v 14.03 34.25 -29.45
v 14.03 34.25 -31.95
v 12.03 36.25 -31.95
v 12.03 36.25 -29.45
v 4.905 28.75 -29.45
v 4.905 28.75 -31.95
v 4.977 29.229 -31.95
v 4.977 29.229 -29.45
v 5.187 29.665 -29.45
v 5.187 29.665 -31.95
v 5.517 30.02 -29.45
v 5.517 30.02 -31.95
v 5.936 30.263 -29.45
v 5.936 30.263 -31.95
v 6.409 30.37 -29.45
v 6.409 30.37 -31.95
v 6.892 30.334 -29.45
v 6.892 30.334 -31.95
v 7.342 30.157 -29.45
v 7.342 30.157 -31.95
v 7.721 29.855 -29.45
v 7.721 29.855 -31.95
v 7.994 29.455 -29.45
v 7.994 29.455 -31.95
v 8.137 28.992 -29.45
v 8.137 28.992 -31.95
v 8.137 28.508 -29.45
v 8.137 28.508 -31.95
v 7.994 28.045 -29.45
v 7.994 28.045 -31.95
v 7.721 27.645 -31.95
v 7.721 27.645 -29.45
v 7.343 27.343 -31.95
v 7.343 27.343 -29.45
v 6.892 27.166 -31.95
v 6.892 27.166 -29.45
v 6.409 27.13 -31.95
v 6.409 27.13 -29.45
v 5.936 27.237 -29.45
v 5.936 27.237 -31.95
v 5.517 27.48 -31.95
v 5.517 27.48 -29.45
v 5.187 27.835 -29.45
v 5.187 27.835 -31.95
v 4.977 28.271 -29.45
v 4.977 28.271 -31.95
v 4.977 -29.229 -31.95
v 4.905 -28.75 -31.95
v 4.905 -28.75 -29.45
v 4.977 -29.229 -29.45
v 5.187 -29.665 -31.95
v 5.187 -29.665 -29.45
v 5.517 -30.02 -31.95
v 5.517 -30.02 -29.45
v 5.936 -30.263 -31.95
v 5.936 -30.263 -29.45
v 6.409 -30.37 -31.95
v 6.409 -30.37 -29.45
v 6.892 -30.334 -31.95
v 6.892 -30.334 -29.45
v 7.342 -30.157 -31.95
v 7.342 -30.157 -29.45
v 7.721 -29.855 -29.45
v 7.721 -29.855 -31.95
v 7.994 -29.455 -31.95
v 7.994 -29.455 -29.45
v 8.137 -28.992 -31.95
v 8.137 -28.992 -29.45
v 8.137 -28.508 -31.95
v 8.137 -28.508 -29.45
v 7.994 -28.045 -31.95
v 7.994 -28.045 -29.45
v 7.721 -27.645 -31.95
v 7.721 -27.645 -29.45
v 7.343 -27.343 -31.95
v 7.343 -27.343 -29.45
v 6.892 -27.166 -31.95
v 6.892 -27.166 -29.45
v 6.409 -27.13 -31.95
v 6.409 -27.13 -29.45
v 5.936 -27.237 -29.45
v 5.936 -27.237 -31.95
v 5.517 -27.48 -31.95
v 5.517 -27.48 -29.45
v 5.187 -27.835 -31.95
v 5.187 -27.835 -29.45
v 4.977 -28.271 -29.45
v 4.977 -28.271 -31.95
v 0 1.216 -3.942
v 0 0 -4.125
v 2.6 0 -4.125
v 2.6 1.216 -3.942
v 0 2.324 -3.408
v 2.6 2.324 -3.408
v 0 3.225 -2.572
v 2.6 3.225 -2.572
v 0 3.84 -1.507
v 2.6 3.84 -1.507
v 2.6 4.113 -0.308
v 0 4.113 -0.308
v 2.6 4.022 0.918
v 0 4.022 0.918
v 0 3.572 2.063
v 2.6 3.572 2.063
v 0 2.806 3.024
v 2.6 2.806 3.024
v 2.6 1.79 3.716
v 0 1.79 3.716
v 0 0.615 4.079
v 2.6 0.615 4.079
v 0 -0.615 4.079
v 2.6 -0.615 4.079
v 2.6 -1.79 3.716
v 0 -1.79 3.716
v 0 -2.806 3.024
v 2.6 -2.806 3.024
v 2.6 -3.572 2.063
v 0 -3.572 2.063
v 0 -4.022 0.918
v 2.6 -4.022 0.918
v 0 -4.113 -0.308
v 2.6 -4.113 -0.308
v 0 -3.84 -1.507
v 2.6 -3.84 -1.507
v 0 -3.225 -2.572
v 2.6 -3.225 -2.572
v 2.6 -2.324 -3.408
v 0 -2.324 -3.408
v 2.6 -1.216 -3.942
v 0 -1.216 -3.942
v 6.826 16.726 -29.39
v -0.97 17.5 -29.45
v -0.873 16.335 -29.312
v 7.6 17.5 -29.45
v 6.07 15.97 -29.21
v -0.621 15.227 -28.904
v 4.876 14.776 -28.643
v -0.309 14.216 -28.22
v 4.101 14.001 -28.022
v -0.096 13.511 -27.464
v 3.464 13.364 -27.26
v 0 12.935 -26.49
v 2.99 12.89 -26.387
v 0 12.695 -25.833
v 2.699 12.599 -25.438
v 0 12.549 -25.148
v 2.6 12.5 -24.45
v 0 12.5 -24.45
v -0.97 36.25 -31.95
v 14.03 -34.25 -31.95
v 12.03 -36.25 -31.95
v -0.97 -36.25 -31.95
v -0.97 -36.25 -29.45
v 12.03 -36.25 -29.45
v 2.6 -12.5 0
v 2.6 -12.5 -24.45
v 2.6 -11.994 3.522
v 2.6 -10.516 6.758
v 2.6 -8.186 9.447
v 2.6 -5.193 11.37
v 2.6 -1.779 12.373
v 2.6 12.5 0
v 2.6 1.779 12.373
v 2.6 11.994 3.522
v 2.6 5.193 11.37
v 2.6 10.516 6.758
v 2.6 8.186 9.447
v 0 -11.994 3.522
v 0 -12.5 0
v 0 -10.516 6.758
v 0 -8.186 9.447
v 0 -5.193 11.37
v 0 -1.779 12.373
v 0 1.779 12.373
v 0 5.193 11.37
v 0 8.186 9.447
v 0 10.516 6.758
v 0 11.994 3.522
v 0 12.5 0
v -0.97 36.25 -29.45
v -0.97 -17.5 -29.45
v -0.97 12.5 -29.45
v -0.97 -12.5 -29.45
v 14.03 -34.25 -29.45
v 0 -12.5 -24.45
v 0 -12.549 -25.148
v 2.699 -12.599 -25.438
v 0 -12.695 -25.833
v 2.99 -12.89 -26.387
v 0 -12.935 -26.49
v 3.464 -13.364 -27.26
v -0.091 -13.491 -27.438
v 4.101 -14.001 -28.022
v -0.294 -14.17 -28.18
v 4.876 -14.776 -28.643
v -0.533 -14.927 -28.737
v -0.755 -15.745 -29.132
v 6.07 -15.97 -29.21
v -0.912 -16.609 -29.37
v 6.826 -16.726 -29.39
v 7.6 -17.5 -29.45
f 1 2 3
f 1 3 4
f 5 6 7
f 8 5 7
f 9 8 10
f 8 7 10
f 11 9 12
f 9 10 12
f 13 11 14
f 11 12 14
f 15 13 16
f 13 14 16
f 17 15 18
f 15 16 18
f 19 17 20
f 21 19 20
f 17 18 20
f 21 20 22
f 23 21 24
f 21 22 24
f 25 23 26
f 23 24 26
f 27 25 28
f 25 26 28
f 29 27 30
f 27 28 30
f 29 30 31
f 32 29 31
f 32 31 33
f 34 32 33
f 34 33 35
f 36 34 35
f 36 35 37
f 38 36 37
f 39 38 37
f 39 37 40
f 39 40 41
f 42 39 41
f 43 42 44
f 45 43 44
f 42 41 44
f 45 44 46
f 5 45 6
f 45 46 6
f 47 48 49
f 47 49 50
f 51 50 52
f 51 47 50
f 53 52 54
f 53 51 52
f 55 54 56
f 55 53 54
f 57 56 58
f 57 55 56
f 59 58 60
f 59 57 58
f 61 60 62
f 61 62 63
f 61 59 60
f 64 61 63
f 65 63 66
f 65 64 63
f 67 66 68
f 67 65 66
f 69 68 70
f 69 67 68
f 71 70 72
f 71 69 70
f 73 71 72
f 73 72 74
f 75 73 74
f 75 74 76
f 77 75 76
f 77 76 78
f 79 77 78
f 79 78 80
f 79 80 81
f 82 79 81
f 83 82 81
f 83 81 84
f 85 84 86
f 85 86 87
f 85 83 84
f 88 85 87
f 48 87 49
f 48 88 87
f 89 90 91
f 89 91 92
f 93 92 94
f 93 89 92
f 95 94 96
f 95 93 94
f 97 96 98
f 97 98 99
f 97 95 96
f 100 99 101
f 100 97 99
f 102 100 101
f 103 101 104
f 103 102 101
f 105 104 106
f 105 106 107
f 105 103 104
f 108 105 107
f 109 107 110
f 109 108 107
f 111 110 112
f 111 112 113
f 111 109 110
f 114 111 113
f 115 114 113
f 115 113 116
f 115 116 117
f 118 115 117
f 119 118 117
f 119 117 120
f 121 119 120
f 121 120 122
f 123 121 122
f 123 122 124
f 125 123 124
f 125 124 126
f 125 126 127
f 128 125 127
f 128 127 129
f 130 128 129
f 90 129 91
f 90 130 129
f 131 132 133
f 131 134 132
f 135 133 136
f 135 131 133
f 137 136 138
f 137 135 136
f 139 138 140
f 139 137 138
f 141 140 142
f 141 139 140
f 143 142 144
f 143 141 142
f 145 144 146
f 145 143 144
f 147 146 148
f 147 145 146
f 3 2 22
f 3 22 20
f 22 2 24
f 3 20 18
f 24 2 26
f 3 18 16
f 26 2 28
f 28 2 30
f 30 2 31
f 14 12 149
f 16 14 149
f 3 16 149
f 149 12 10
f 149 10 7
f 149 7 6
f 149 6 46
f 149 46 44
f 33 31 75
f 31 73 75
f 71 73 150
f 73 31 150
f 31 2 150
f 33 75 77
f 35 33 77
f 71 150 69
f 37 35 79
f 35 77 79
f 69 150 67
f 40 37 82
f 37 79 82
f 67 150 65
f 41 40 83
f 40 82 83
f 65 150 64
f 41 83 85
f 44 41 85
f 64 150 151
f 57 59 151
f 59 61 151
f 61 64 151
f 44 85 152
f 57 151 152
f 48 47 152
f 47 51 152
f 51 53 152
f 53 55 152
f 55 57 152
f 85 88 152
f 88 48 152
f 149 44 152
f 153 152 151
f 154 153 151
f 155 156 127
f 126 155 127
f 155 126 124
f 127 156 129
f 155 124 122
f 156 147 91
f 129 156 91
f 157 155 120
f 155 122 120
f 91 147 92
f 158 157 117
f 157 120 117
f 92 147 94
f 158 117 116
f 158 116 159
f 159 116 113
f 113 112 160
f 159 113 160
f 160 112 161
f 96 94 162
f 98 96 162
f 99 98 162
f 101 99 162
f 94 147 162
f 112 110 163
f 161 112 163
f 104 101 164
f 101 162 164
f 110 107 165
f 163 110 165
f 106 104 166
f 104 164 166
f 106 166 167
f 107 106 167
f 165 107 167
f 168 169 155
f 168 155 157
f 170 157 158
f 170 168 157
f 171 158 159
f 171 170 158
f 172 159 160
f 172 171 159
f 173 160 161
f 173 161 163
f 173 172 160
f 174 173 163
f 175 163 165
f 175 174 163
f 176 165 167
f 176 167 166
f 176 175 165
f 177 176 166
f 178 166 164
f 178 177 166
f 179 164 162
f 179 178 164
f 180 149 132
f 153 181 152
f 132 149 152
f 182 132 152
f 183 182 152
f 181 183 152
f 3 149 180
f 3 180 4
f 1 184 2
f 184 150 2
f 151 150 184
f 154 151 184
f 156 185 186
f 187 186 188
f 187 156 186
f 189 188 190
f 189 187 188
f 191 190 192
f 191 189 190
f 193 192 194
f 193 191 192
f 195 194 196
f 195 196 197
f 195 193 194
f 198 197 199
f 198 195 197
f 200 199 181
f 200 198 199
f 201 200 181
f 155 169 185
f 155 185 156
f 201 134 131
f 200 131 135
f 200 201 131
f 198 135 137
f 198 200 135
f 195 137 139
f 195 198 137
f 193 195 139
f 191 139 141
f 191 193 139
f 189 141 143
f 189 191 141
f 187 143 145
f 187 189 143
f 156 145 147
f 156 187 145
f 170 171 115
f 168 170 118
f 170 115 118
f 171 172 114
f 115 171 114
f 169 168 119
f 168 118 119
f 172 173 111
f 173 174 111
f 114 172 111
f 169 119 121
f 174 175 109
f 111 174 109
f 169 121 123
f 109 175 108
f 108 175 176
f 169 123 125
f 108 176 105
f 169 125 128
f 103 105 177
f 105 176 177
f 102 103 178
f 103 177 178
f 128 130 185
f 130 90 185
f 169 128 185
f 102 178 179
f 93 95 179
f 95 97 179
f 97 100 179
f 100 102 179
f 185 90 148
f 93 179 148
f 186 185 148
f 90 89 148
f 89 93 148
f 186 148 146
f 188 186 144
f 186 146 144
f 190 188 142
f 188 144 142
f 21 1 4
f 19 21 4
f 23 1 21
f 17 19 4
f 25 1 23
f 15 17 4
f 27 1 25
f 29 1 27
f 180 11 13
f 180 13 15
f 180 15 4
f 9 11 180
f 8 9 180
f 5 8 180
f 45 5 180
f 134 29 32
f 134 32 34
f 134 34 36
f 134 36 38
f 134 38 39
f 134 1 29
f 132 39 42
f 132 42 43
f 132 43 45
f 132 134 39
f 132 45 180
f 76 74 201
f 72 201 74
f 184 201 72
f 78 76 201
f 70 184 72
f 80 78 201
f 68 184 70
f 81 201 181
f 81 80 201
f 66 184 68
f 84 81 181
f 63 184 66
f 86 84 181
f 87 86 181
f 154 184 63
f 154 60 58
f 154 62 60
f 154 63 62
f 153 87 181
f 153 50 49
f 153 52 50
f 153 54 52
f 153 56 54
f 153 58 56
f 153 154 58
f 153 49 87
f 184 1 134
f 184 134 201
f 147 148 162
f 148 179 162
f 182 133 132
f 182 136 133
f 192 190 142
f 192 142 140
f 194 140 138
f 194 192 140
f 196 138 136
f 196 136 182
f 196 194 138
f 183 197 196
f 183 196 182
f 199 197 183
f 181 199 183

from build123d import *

# Parameters (mm, degrees)
SKETCH1_R               = 4.125
BOSS_EXTRUDE1_DEPTH     = 2.6
BOSS_EXTRUDE4_DEPTH     = 2.5
CUT_EXTRUDE2_REACH      = 80.314
SKETCH7_W               = 7
SKETCH7_H               = 16.5
SKETCH7_W_2             = 16
SKETCH7_H_2             = 8
CUT_EXTRUDE3_REACH      = 82.041
SKETCH9_W               = 2.6
SKETCH9_H               = 22.388822383
SKETCH8_W               = 2.6
SKETCH8_H               = 27.825
BOSS_EXTRUDE5_DEPTH     = 12.5
FILLET2_R               = 1
FILLET3_R               = 4
CUT_EXTRUDE4_DEPTH      = 74.103052287
CUT_EXTRUDE4_DEPTH_BACK = 74.103052287
SKETCH10_W              = 78.235731334
SKETCH10_H              = 6.290045588
SKETCH11_W              = 15
SKETCH11_H              = 2.5
BOSS_EXTRUDE6_DEPTH     = 12.5
BOSS_EXTRUDE7_DEPTH     = 2.5
SKETCH14_R              = 1.625
CUT_EXTRUDE5_DEPTH      = 2.5
FILLET4_R               = 5
CHAMFER1_SIZE           = 2


with BuildPart() as part:
    # Sketch1 → Boss-Extrude1 (new body)
    with BuildSketch(Plane(origin=(0, 0, 0), x_dir=(0, 0, -1), z_dir=(1, 0, 0))):
        with BuildLine():
            Line((0, 12.5), (34.45, 12.5))
            Line((34.45, 12.5), (34.45, -12.5))
            Line((34.45, -12.5), (0, -12.5))
            ThreePointArc((0, -12.5), (-12.5, 0), (0, 12.5))
        make_face()
        Circle(SKETCH1_R, mode=Mode.SUBTRACT)
    extrude(amount=BOSS_EXTRUDE1_DEPTH)

    # Sketch6 → Boss-Extrude4 (add)
    with BuildSketch(Plane(origin=(0, 0, -34.45), x_dir=(-1, 0, 0), z_dir=(0, 0, -1))):
        Polygon((-8.812505246, 36.25), (53.321583376, 36.25), (53.321583376, -36.25), (6.25, -36.25), (-19.178416624, -36.25), (-19.178416624, 36.25), align=None)
    extrude(amount=-BOSS_EXTRUDE4_DEPTH)

    # Sketch7 → Cut-Extrude2 (cut, up to next)
    with BuildSketch(Plane.XY.offset(-31.95), mode=Mode.PRIVATE) as cut_extrude2_sk1:
        with Locations((-1.711858899, -11.632438111)):
            Rectangle(SKETCH7_W, SKETCH7_H)
    cut_extrude2_tool1 = extrude(cut_extrude2_sk1.sketch, amount=-CUT_EXTRUDE2_REACH, mode=Mode.PRIVATE) & part.part
    # Sketch7 → Cut-Extrude2 (cut, up to next)
    with BuildSketch(Plane.XY.offset(-31.95), mode=Mode.PRIVATE) as cut_extrude2_sk2:
        with Locations((-16.5, 0)):
            Rectangle(SKETCH7_W_2, SKETCH7_H_2)
    cut_extrude2_tool2 = extrude(cut_extrude2_sk2.sketch, amount=-CUT_EXTRUDE2_REACH, mode=Mode.PRIVATE) & part.part
    add(cut_extrude2_tool1.solids().sort_by_distance((-1.711859, -11.632438, -31.95))[0], mode=Mode.SUBTRACT)
    add(cut_extrude2_tool2.solids().sort_by_distance((-16.5, 0, -31.95))[0], mode=Mode.SUBTRACT)

    # Sketch9 → Cut-Extrude3 (cut, up to next)
    with BuildSketch(Plane.XZ.offset(12.5), mode=Mode.PRIVATE) as cut_extrude3_sk1:
        with Locations((1.3, -20.755588809)):
            Rectangle(SKETCH9_W, SKETCH9_H)
    cut_extrude3_tool1 = extrude(cut_extrude3_sk1.sketch, amount=-CUT_EXTRUDE3_REACH, mode=Mode.PRIVATE) & part.part
    add(cut_extrude3_tool1.solids().sort_by_distance((1.3, -12.5, -20.755589))[0], mode=Mode.SUBTRACT)


with BuildPart() as cut_extrude3_piece_1:
    # of the separate pieces the step leaves, piece 1, a body of its own (cut_extrude3_pieces)
    add(part.part.solids().sort_by_distance((-53.321583376, 36.25, -31.95))[0])



with BuildPart() as cut_extrude3_piece_2:
    # of the separate pieces the step leaves, piece 2, a body of its own (cut_extrude3_pieces)
    add(part.part.solids().sort_by_distance((0, 12.5, 0))[0])


with BuildPart() as cut_extrude3_piece_1_1:
    add(cut_extrude3_piece_1.part)

    add(cut_extrude3_piece_2.part)  # Boss-Extrude5 merges Cut-Extrude3 piece 2
    # Sketch8 → Boss-Extrude5 (add, symmetric)
    with BuildSketch(Plane(origin=(0, 0, 0), x_dir=(1, 0, 0), z_dir=(0, 1, 0))):
        with Locations((1.3, 18.0375)):
            Rectangle(SKETCH8_W, SKETCH8_H)
    extrude(amount=BOSS_EXTRUDE5_DEPTH, both=True)

    # Fillet2
    fillet2_edges = [cut_extrude3_piece_1_1.edges().sort_by_distance(p)[0] for p in [
        (-8.5, 4, -33.2),
        (-8.5, -4, -33.2),
        (-24.5, -4, -33.2),
        (-24.5, 4, -33.2),
        (-5.211858899, -19.882438111, -33.2),
        (-5.211858899, -3.382438111, -33.2),
        (1.788141101, -3.382438111, -33.2),
        (1.788141101, -19.882438111, -33.2),
    ]]
    fillet(fillet2_edges, radius=FILLET2_R)

    # Fillet3
    fillet3_edges = [cut_extrude3_piece_1_1.edges().sort_by_distance(p)[0] for p in [
        (19.178416624, 36.25, -33.2),
        (-53.321583376, 36.25, -33.2),
        (-53.321583376, -36.25, -33.2),
        (19.178416624, -36.25, -33.2),
    ]]
    fillet(fillet3_edges, radius=FILLET3_R)

    # Sketch10 → Cut-Extrude4 (cut, two sides: drawn at the far end of the back side and taken through both)
    with BuildSketch(Plane(origin=(0, 0, 0), x_dir=(1, 0, 0), z_dir=(0, 1, 0)).offset(-CUT_EXTRUDE4_DEPTH_BACK)):
        with Locations((-17.391929865, 35.095022794)):
            Rectangle(SKETCH10_W, SKETCH10_H)
    extrude(amount=CUT_EXTRUDE4_DEPTH + CUT_EXTRUDE4_DEPTH_BACK, mode=Mode.SUBTRACT)

    # Sketch11 → Boss-Extrude6 (add, symmetric)
    with BuildSketch(Plane(origin=(0, 0, 0), x_dir=(1, 0, 0), z_dir=(0, 1, 0))):
        with Locations((6.53, 30.7)):
            Rectangle(SKETCH11_W, SKETCH11_H)
    boss_extrude6 = extrude(amount=BOSS_EXTRUDE6_DEPTH, both=True)

    # Sketch13 → Boss-Extrude7 (add)
    with BuildSketch(Plane(origin=(0, 0, -31.95), x_dir=(-1, 0, 0), z_dir=(0, 0, -1))):
        Polygon((-14.03, 12.5), (0.97, 12.5), (0.97, 36.25), (-10.03, 36.25), (-14.03, 36.25), (-14.03, 32.25), align=None)
    boss_extrude7 = extrude(amount=-BOSS_EXTRUDE7_DEPTH)

    # Mirror1: Boss-Extrude6, Boss-Extrude7 across plane
    add(boss_extrude6.mirror(Plane.ZX))
    add(boss_extrude7.mirror(Plane.ZX))

    # Sketch14 → Cut-Extrude5 (cut)
    with BuildSketch(Plane(origin=(0, 0, -31.95), x_dir=(-1, 0, 0), z_dir=(0, 0, -1))):
        with Locations((-6.53, 28.75)):
            Circle(SKETCH14_R)
    cut_extrude5 = extrude(amount=-CUT_EXTRUDE5_DEPTH, mode=Mode.SUBTRACT)

    # Mirror2: Cut-Extrude5 across plane
    add(cut_extrude5.mirror(Plane.ZX), mode=Mode.SUBTRACT)

    # Fillet4
    # the kernel refuses this fillet: 5 mm, written as the material it adds along each edge
    with BuildSketch(Plane(origin=(2.6, -12.5, -29.45), x_dir=(1, 0, 0), z_dir=(0, 1, 0))) as fillet4_piece_1:
        with BuildLine():
            CenterArc((FILLET4_R, -FILLET4_R), FILLET4_R, 90, 90)
            Line((0, -FILLET4_R), (-FILLET4_R * 0.02, -FILLET4_R))
            Line((-FILLET4_R * 0.02, -FILLET4_R), (-FILLET4_R * 0.02, FILLET4_R * 0.02))
            Line((-FILLET4_R * 0.02, FILLET4_R * 0.02), (FILLET4_R, FILLET4_R * 0.02))
            Line((FILLET4_R, FILLET4_R * 0.02), (FILLET4_R, 0))
        make_face()
    extrude(amount=25)
    with BuildSketch(Plane(origin=(0, -12.5, -29.45), x_dir=(-1, 0, 0), z_dir=(0, 1, 0))) as fillet4_piece_2:
        with BuildLine():
            CenterArc((5, 2.959577673), FILLET4_R, 180, 36.293058493)
            Line((0, 2.959577673), (-0.1, 2.959577673))
            Line((-0.1, 2.959577673), (-0.1, 0))
            Line((-0.1, 0), (0, -0.1))
            ThreePointArc((0, -0.1), (0.485, -0.1), (0.8894, -0.059191553))
            Line((0.8894, -0.059191553), (0.97, 0))
        make_face()
    extrude(amount=25)
    with BuildSketch(Plane(origin=(2.6, 12.5, -29.45), x_dir=(0, 0, 1), z_dir=(-1, 0, 0)), Plane(origin=(2.6, -12.5, -29.45), x_dir=(0, -1, 0), z_dir=(-1, 0, 0))) as fillet4_piece_3:
        with BuildLine():
            CenterArc((FILLET4_R, FILLET4_R), FILLET4_R, 180, 90)
            Line((0, FILLET4_R), (-FILLET4_R * 0.02, FILLET4_R))
            Line((-FILLET4_R * 0.02, FILLET4_R), (-FILLET4_R * 0.02, -FILLET4_R * 0.02))
            Line((-FILLET4_R * 0.02, -FILLET4_R * 0.02), (FILLET4_R, -FILLET4_R * 0.02))
            Line((FILLET4_R, -FILLET4_R * 0.02), (FILLET4_R, 0))
        make_face()
    extrude(amount=2.6)
    with BuildSketch(Plane(origin=(2.6, -25, -29.45), x_dir=(1, 0, 0), z_dir=(0, 1, 0))) as fillet4_piece_4a_section:
        with BuildLine():
            CenterArc((FILLET4_R, -FILLET4_R), FILLET4_R, 90, 90)
            Line((0, -FILLET4_R), (-FILLET4_R * 0.02, -FILLET4_R))
            Line((-FILLET4_R * 0.02, -FILLET4_R), (-FILLET4_R * 0.02, FILLET4_R * 0.02))
            Line((-FILLET4_R * 0.02, FILLET4_R * 0.02), (FILLET4_R, FILLET4_R * 0.02))
            Line((FILLET4_R, FILLET4_R * 0.02), (FILLET4_R, 0))
        make_face()
    fillet4_piece_4a = extrude(amount=37.5, mode=Mode.PRIVATE)
    fillet4_piece_4a = split(fillet4_piece_4a, bisect_by=Plane(origin=(3.731975571, -12.5, -28.318024429), z_dir=(0, -1, 0)), keep=Keep.TOP, mode=Mode.PRIVATE)
    with BuildSketch(Plane(origin=(15.1, -12.5, -29.45), x_dir=(0, -1, 0), z_dir=(-1, 0, 0))) as fillet4_piece_4b_section:
        with BuildLine():
            CenterArc((FILLET4_R, FILLET4_R), FILLET4_R, 180, 90)
            Line((0, FILLET4_R), (-FILLET4_R * 0.02, FILLET4_R))
            Line((-FILLET4_R * 0.02, FILLET4_R), (-FILLET4_R * 0.02, -FILLET4_R * 0.02))
            Line((-FILLET4_R * 0.02, -FILLET4_R * 0.02), (FILLET4_R, -FILLET4_R * 0.02))
            Line((FILLET4_R, -FILLET4_R * 0.02), (FILLET4_R, 0))
        make_face()
    fillet4_piece_4b = extrude(amount=15.1, mode=Mode.PRIVATE)
    fillet4_piece_4b = split(fillet4_piece_4b, bisect_by=Plane(origin=(14.03, -13.631975571, -28.318024429), z_dir=(-1, 0, 0)), keep=Keep.TOP, mode=Mode.PRIVATE)
    fillet4_piece_4b = split(fillet4_piece_4b, bisect_by=Plane(origin=(2.6, -13.631975571, -28.318024429), z_dir=(1, 0, 0)), keep=Keep.TOP, mode=Mode.PRIVATE)
    fillet4_piece_4 = fillet4_piece_4a & fillet4_piece_4b
    add(fillet4_piece_4)
    with BuildSketch(Plane(origin=(15.1, 12.5, -29.45), x_dir=(0, 0, 1), z_dir=(-1, 0, 0))) as fillet4_piece_5a_section:
        with BuildLine():
            CenterArc((FILLET4_R, FILLET4_R), FILLET4_R, 180, 90)
            Line((0, FILLET4_R), (-FILLET4_R * 0.02, FILLET4_R))
            Line((-FILLET4_R * 0.02, FILLET4_R), (-FILLET4_R * 0.02, -FILLET4_R * 0.02))
            Line((-FILLET4_R * 0.02, -FILLET4_R * 0.02), (FILLET4_R, -FILLET4_R * 0.02))
            Line((FILLET4_R, -FILLET4_R * 0.02), (FILLET4_R, 0))
        make_face()
    fillet4_piece_5a = extrude(amount=15.1, mode=Mode.PRIVATE)
    fillet4_piece_5a = split(fillet4_piece_5a, bisect_by=Plane(origin=(2.6, 13.631975571, -28.318024429), z_dir=(1, 0, 0)), keep=Keep.TOP, mode=Mode.PRIVATE)
    fillet4_piece_5a = split(fillet4_piece_5a, bisect_by=Plane(origin=(14.03, 13.631975571, -28.318024429), z_dir=(-1, 0, 0)), keep=Keep.TOP, mode=Mode.PRIVATE)
    with BuildSketch(Plane(origin=(2.6, -12.5, -29.45), x_dir=(1, 0, 0), z_dir=(0, 1, 0))) as fillet4_piece_5b_section:
        with BuildLine():
            CenterArc((FILLET4_R, -FILLET4_R), FILLET4_R, 90, 90)
            Line((0, -FILLET4_R), (-FILLET4_R * 0.02, -FILLET4_R))
            Line((-FILLET4_R * 0.02, -FILLET4_R), (-FILLET4_R * 0.02, FILLET4_R * 0.02))
            Line((-FILLET4_R * 0.02, FILLET4_R * 0.02), (FILLET4_R, FILLET4_R * 0.02))
            Line((FILLET4_R, FILLET4_R * 0.02), (FILLET4_R, 0))
        make_face()
    fillet4_piece_5b = extrude(amount=37.5, mode=Mode.PRIVATE)
    fillet4_piece_5b = split(fillet4_piece_5b, bisect_by=Plane(origin=(3.731975571, 12.5, -28.318024429), z_dir=(0, 1, 0)), keep=Keep.TOP, mode=Mode.PRIVATE)
    fillet4_piece_5 = fillet4_piece_5a & fillet4_piece_5b
    add(fillet4_piece_5)
    with BuildSketch(Plane(origin=(2.6, -12.5, -29.45), x_dir=(0, -1, 0), z_dir=(-1, 0, 0))) as fillet4_piece_6a_section:
        with BuildLine():
            CenterArc((FILLET4_R, FILLET4_R), FILLET4_R, 180, 90)
            Line((0, FILLET4_R), (-FILLET4_R * 0.02, FILLET4_R))
            Line((-FILLET4_R * 0.02, FILLET4_R), (-FILLET4_R * 0.02, -FILLET4_R * 0.02))
            Line((-FILLET4_R * 0.02, -FILLET4_R * 0.02), (FILLET4_R, -FILLET4_R * 0.02))
            Line((FILLET4_R, -FILLET4_R * 0.02), (FILLET4_R, 0))
        make_face()
    fillet4_piece_6a = extrude(amount=15.1, mode=Mode.PRIVATE)
    fillet4_piece_6a = split(fillet4_piece_6a, bisect_by=Plane(origin=(-0.97, -13.631975571, -28.318024429), z_dir=(1, 0, 0)), keep=Keep.TOP, mode=Mode.PRIVATE)
    fillet4_piece_6a = split(fillet4_piece_6a, bisect_by=Plane(origin=(0, -13.631975571, -28.318024429), z_dir=(-1, 0, 0)), keep=Keep.TOP, mode=Mode.PRIVATE)
    with BuildSketch(Plane(origin=(0, -19.898944181, -29.45), x_dir=(-1, 0, 0), z_dir=(0, 1, 0))) as fillet4_piece_6b_section:
        with BuildLine():
            CenterArc((5, 2.959577673), FILLET4_R, 180, 36.293058493)
            Line((0, 2.959577673), (-0.1, 2.959577673))
            Line((-0.1, 2.959577673), (-0.1, 0))
            Line((-0.1, 0), (0, -0.1))
            ThreePointArc((0, -0.1), (0.485, -0.1), (0.8894, -0.059191553))
            Line((0.8894, -0.059191553), (0.97, 0))
        make_face()
    fillet4_piece_6b = extrude(amount=32.398944181, mode=Mode.PRIVATE)
    fillet4_piece_6b = split(fillet4_piece_6b, bisect_by=Plane(origin=(-0.217435867, -12.5, -28.607978011), z_dir=(0, -1, 0)), keep=Keep.TOP, mode=Mode.PRIVATE)
    fillet4_piece_6 = fillet4_piece_6a & fillet4_piece_6b
    add(fillet4_piece_6)
    with BuildSketch(Plane(origin=(2.6, 12.5, -29.45), x_dir=(0, 0, 1), z_dir=(-1, 0, 0))) as fillet4_piece_7a_section:
        with BuildLine():
            CenterArc((FILLET4_R, FILLET4_R), FILLET4_R, 180, 90)
            Line((0, FILLET4_R), (-FILLET4_R * 0.02, FILLET4_R))
            Line((-FILLET4_R * 0.02, FILLET4_R), (-FILLET4_R * 0.02, -FILLET4_R * 0.02))
            Line((-FILLET4_R * 0.02, -FILLET4_R * 0.02), (FILLET4_R, -FILLET4_R * 0.02))
            Line((FILLET4_R, -FILLET4_R * 0.02), (FILLET4_R, 0))
        make_face()
    fillet4_piece_7a = extrude(amount=15.1, mode=Mode.PRIVATE)
    fillet4_piece_7a = split(fillet4_piece_7a, bisect_by=Plane(origin=(0, 13.631975571, -28.318024429), z_dir=(-1, 0, 0)), keep=Keep.TOP, mode=Mode.PRIVATE)
    fillet4_piece_7a = split(fillet4_piece_7a, bisect_by=Plane(origin=(-0.97, 13.631975571, -28.318024429), z_dir=(1, 0, 0)), keep=Keep.TOP, mode=Mode.PRIVATE)
    with BuildSketch(Plane(origin=(0, -12.5, -29.45), x_dir=(-1, 0, 0), z_dir=(0, 1, 0))) as fillet4_piece_7b_section:
        with BuildLine():
            CenterArc((5, 2.959577673), FILLET4_R, 180, 36.293058493)
            Line((0, 2.959577673), (-0.1, 2.959577673))
            Line((-0.1, 2.959577673), (-0.1, 0))
            Line((-0.1, 0), (0, -0.1))
            ThreePointArc((0, -0.1), (0.485, -0.1), (0.8894, -0.059191553))
            Line((0.8894, -0.059191553), (0.97, 0))
        make_face()
    fillet4_piece_7b = extrude(amount=32.398944181, mode=Mode.PRIVATE)
    fillet4_piece_7b = split(fillet4_piece_7b, bisect_by=Plane(origin=(-0.217435867, 12.5, -28.607978011), z_dir=(0, 1, 0)), keep=Keep.TOP, mode=Mode.PRIVATE)
    fillet4_piece_7 = fillet4_piece_7a & fillet4_piece_7b
    add(fillet4_piece_7)

    # Chamfer1
    chamfer1_edges = [cut_extrude3_piece_1_1.edges().sort_by_distance(p)[0] for p in [
        (14.03, 36.25, -30.7),
        (14.03, -36.25, -30.7),
    ]]
    chamfer(chamfer1_edges, length=CHAMFER1_SIZE)


solid = cut_extrude3_piece_1_1.part
